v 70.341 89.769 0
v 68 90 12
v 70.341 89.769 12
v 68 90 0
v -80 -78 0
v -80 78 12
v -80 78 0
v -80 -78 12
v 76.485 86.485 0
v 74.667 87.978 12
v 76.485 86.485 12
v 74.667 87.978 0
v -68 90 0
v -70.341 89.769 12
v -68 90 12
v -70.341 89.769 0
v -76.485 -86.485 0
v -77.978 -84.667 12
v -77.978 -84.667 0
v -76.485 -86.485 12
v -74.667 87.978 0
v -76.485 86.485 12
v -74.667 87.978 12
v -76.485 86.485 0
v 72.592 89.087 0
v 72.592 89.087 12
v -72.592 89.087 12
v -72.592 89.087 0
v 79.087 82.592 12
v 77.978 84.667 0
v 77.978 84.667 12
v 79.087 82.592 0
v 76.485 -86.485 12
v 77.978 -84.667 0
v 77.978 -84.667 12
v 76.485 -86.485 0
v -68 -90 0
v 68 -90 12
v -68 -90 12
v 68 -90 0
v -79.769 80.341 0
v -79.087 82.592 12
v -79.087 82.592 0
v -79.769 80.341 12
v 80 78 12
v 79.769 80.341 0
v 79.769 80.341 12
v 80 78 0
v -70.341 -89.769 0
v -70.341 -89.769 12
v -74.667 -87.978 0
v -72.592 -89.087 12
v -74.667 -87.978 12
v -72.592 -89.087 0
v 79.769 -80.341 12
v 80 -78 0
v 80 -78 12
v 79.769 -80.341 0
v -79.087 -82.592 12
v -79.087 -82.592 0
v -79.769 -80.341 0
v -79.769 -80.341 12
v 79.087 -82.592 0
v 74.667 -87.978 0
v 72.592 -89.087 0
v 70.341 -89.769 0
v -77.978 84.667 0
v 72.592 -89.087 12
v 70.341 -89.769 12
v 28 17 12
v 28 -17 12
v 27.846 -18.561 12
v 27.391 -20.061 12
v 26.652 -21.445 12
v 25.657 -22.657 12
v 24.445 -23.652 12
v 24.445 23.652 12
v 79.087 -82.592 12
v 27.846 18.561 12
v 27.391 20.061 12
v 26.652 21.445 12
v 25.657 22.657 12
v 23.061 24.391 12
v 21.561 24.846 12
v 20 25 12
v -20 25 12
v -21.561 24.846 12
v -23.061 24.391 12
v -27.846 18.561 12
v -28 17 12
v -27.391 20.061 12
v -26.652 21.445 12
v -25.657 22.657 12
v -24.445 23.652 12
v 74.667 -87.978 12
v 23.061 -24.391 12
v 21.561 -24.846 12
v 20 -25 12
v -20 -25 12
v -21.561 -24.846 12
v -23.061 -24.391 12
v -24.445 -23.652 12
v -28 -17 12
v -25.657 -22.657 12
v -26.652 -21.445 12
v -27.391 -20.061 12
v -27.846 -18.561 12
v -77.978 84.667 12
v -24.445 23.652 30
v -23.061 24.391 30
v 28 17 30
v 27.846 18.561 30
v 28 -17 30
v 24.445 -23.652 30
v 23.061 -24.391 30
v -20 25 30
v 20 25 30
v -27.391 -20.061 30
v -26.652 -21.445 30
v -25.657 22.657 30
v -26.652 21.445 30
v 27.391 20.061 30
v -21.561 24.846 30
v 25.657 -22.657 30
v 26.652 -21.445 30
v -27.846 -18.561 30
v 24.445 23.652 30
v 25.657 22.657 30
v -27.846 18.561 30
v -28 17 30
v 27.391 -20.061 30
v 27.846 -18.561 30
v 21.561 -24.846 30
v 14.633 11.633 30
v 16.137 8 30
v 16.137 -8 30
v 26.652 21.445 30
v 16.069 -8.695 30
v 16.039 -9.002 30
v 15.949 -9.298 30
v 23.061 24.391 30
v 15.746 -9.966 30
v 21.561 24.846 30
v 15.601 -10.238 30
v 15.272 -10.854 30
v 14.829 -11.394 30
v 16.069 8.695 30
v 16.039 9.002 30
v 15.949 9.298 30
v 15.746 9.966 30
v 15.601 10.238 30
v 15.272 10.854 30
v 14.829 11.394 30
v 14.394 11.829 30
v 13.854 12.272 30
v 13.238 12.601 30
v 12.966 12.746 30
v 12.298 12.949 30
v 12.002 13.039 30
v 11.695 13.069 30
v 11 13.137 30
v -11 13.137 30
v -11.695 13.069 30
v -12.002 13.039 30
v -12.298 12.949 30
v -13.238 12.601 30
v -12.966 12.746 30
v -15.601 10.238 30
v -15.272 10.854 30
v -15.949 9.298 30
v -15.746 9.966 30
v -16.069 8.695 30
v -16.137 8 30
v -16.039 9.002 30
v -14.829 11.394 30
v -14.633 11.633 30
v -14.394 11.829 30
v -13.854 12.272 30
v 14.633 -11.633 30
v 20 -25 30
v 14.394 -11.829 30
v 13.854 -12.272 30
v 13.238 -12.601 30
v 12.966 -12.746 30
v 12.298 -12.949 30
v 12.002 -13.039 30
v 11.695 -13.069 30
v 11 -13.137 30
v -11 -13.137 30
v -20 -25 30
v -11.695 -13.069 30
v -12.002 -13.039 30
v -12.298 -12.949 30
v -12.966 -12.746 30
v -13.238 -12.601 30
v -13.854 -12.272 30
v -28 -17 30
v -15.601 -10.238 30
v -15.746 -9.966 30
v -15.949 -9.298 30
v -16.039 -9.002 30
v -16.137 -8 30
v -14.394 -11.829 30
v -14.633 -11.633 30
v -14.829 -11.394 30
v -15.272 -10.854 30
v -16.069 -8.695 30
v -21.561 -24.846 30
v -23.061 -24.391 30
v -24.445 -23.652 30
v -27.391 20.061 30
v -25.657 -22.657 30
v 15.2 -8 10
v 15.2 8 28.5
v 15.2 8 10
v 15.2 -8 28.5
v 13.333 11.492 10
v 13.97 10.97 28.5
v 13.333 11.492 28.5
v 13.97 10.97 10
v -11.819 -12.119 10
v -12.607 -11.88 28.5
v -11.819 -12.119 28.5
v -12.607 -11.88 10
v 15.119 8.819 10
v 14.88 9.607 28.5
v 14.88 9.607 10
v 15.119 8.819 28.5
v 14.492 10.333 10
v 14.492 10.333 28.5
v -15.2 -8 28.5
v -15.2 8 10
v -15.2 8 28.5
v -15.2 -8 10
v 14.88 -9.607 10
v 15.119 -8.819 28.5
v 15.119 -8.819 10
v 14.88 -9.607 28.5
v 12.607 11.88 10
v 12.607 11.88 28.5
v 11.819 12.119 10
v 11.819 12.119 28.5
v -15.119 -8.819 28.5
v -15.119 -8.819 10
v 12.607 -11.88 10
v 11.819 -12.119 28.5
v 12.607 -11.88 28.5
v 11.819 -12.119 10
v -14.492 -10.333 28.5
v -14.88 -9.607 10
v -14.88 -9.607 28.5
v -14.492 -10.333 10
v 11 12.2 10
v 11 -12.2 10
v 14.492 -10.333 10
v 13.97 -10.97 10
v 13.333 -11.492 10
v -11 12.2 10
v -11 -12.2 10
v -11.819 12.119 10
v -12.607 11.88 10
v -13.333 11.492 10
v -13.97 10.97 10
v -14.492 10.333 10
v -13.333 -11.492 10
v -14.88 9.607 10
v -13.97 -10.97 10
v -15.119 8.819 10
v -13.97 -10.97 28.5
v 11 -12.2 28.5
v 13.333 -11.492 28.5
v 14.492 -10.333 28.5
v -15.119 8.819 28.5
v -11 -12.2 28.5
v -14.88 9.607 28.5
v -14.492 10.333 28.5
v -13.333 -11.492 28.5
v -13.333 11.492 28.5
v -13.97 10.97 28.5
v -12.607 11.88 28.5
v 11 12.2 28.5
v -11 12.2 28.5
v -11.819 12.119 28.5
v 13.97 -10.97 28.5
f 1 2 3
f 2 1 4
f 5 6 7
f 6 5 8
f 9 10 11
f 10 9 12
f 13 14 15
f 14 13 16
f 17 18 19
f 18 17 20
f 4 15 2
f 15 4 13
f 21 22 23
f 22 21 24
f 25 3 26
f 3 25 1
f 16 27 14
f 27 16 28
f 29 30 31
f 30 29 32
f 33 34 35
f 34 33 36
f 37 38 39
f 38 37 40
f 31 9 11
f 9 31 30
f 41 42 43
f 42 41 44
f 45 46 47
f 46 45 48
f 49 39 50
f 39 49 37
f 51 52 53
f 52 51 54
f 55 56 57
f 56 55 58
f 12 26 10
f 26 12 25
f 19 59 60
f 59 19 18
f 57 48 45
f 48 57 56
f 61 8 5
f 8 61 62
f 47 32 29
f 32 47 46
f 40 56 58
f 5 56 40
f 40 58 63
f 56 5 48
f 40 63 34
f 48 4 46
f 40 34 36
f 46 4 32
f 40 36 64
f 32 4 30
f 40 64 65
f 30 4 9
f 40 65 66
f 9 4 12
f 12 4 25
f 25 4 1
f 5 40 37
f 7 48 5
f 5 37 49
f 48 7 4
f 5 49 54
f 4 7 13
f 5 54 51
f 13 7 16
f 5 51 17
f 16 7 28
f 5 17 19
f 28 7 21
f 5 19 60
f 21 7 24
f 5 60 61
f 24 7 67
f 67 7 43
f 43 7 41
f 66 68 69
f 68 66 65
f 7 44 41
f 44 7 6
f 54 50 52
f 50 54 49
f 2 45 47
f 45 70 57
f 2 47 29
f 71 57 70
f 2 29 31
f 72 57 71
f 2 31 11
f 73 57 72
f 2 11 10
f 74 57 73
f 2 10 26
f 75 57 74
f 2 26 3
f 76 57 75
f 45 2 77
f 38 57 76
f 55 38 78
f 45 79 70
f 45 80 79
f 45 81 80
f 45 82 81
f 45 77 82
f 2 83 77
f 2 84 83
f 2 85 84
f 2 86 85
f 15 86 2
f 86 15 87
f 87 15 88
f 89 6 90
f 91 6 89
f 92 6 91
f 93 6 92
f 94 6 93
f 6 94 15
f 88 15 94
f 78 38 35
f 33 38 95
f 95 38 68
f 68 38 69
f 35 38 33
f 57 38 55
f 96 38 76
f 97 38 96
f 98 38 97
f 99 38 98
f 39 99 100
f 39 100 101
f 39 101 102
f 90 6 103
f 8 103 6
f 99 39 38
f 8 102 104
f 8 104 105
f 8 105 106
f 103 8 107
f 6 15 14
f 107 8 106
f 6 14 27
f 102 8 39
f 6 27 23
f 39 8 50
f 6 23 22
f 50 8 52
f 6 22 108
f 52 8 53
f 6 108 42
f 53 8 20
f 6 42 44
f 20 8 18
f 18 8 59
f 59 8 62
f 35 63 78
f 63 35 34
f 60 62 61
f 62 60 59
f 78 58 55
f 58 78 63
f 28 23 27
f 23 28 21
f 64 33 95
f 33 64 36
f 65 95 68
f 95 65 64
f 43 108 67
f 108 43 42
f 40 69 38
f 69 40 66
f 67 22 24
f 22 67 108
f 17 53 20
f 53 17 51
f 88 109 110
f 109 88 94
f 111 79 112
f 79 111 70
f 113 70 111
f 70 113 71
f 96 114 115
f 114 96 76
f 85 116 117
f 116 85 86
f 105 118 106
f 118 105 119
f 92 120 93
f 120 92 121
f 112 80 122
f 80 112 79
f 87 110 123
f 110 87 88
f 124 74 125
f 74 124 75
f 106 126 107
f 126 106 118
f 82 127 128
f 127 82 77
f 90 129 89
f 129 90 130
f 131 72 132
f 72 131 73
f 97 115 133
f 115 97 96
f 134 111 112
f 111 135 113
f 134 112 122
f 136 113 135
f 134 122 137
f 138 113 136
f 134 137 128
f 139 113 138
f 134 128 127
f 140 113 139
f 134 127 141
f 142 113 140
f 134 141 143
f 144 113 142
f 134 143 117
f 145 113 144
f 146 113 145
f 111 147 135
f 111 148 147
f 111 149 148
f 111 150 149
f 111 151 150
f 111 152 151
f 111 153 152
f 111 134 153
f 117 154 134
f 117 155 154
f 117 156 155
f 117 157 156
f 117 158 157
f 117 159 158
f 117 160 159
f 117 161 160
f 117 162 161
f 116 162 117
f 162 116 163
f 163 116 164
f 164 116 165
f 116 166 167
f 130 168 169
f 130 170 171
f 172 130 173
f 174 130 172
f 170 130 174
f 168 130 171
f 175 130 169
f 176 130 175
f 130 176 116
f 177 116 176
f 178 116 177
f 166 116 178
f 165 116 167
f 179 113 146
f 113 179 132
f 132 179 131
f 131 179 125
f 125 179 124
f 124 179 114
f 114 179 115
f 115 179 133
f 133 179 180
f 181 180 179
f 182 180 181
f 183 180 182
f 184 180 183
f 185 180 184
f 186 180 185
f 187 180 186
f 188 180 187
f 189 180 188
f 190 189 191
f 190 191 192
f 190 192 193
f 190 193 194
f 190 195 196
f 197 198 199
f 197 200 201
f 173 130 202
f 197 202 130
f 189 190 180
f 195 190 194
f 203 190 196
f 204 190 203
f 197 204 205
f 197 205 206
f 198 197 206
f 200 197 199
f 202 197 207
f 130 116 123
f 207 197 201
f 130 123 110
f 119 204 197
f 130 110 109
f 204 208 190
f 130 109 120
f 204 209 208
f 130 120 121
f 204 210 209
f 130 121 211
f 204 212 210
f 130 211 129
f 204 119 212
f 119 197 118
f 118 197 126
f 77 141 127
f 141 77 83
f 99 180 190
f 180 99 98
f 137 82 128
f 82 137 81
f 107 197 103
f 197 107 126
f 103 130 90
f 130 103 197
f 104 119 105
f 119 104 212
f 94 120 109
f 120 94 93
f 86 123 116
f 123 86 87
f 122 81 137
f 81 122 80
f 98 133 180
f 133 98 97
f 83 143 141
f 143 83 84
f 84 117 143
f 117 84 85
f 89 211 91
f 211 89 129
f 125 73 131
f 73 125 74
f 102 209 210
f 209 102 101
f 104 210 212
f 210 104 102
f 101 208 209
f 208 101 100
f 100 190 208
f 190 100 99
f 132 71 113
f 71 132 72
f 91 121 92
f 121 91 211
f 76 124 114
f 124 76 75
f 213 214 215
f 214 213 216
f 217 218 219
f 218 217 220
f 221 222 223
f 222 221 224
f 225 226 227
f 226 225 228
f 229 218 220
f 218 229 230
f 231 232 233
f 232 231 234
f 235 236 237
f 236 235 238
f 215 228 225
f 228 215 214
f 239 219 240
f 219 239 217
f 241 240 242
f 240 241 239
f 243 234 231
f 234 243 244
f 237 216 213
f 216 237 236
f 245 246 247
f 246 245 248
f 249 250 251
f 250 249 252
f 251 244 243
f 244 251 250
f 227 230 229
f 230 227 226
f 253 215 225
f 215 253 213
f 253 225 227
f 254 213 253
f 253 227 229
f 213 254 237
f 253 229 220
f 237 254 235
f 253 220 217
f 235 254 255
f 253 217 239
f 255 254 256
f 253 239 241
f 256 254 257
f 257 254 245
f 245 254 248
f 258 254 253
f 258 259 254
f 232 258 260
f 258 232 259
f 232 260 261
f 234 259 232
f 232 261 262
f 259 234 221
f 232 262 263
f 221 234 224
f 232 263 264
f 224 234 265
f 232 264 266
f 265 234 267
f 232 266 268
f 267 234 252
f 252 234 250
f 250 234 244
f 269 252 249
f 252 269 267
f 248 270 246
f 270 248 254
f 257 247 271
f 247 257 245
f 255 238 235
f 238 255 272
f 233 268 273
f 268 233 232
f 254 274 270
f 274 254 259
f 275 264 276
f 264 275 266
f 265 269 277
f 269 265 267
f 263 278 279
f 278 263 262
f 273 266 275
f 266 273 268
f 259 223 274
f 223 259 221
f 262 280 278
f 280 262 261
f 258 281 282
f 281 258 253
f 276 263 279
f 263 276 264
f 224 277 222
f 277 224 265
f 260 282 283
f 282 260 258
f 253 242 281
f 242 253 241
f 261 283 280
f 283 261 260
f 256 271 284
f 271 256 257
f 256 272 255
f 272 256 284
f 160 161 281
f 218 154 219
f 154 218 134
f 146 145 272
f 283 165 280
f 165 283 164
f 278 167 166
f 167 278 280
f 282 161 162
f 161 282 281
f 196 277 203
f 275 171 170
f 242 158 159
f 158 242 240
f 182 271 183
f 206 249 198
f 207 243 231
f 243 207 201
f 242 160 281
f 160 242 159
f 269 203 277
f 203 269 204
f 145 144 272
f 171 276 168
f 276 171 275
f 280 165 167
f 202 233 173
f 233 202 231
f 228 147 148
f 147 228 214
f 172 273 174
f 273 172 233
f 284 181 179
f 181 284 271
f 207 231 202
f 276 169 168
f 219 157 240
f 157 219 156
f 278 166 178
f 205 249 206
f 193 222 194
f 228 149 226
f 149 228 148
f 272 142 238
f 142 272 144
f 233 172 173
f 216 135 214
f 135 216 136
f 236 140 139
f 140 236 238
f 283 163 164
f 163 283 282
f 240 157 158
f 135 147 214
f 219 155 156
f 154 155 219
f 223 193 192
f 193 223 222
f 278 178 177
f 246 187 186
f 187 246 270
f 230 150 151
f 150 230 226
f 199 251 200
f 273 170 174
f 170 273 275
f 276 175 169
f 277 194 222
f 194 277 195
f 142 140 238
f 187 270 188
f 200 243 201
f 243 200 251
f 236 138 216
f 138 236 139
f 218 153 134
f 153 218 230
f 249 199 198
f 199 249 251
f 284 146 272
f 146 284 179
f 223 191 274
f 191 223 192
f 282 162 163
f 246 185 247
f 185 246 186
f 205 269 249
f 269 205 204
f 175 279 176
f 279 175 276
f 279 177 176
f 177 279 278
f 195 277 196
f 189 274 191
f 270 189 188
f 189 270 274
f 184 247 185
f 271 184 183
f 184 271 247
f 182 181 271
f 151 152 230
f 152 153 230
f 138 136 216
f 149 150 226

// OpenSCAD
// Headphone stand in three parts - PLA, no supports, 0.4mm nozzle
// Print orientations (+Z up, bottom on bed):
//   base   : flat, plate bottom on bed
//   post   : vertical, bottom on bed (250+ tall)
//   hanger : flat bottom on bed, curved top up, socket opening down (bridged)
// Assembly (desk Z=0): base 0-30, post 10-262, hanger 244-270 (top ~270)

part = "base"; // [base:Base, post:Post, hanger:Hanger, assembly:Assembly]
cadverify_only = "";
module instance(name, part, unit = 1) {
    echo(cadverify_instance = [name, part, unit]);
    if (cadverify_only == "" || cadverify_only == name) children();
}

// ---------- parameters ----------
baseW = 160; baseD = 180; baseT = 12; baseR = 12;
bossW = 56; bossD = 50; bossH = 18; bossR = 8;
bossTop = baseT + bossH; // 30
sockW = 30.4; sockD = 24.4; sockR = 4.2; // base socket (post 30x24 +0.4)
sockDepthBase = 20;
sockFloorBase = bossTop - sockDepthBase; // 10
flare = 1.5;
mouthWBase = sockW + 2*flare; mouthDBase = sockD + 2*flare; mouthRBase = sockR + flare;

postW = 30; postD = 24; postR = 4; postH = 252; postCham = 1.5;
tipW = postW - 2*postCham; tipD = postD - 2*postCham; tipR = 2.5;

hangW = 42; hangL = 120; hangZc = 26; hangZe = 14; hangFillet = 8; hangPlanR = 15;
hangSockW = 30.4; hangSockD = 24.4; hangSockR = 4.2; hangSockDepth = 18;
mouthWH = hangSockW + 2*flare; mouthDH = hangSockD + 2*flare; mouthRH = hangSockR + flare;

postZ = 10;          // post bottom in assembly
hangerZ = 244;       // hanger bottom in assembly -> top 270
// post top = postZ+postH = 262 = hangerZ+hangSockDepth (socket floor)

// ---------- helpers ----------
module rounded_box(W,D,H,R) {
    // centered in XY, bottom at Z=0
    if (R <= 0.01) {
        translate([-W/2,-D/2,0]) cube([W,D,H]);
    } else {
        hull() {
            for (sx=[-1,1], sy=[-1,1])
                translate([sx*(W/2-R), sy*(D/2-R), 0])
                    cylinder(r=R, h=H, $fn=32);
        }
    }
}
module rect_frustum(W1,D1,R1, W2,D2,R2, H) {
    // bottom size 1 at Z=0, top size 2 at Z=H
    hull() {
        translate([0,0,0]) rounded_box(W1,D1,0.1,R1);
        translate([0,0,H-0.1]) rounded_box(W2,D2,0.1,R2);
    }
}

// ---------- parts (print orientation, bottom Z=0, centered XY) ----------
module base_part() {
    difference() {
        union() {
            rounded_box(baseW, baseD, baseT, baseR);
            translate([0,0,baseT-0.2]) rounded_box(bossW, bossD, bossH+0.2, bossR);
        }
        // socket bore (extend above mouth for clean cut)
        translate([0,0,sockFloorBase]) rounded_box(sockW, sockD, sockDepthBase+1.0, sockR);
        // entry flare 45deg (mouth larger at top)
        translate([0,0,bossTop-flare])
            rect_frustum(sockW,sockD,sockR, mouthWBase,mouthDBase,mouthRBase, flare+1.0);
    }
}

module post_part() {
    union() {
        // middle shaft (overlap frustums)
        translate([0,0,postCham-0.2]) rounded_box(postW, postD, postH-2*postCham+0.4, postR);
        // bottom lead-in (small face on bed)
        translate([0,0,0]) rect_frustum(tipW,tipD,tipR, postW,postD,postR, postCham+0.2);
        // top lead-in
        translate([0,0,postH-postCham-0.2]) rect_frustum(postW,postD,postR, tipW,tipD,tipR, postCham+0.2);
    }
}

module hanger_A() {
    union() {
        // lower block 0 .. Zc-r
        translate([-hangW/2, -hangL/2, 0]) cube([hangW, hangL, hangZc-hangFillet]);
        // upper block (narrower) Zc-r .. top
        translate([-(hangW-2*hangFillet)/2, -hangL/2, hangZc-hangFillet])
            cube([hangW-2*hangFillet, hangL, hangFillet]);
        // two side fillet cylinders along Y
        for (sx=[-1,1])
            translate([sx*(hangW/2-hangFillet), -hangL/2, hangZc-hangFillet])
                rotate([-90,0,0])
                    cylinder(r=hangFillet, h=hangL, $fn=32);
    }
}
module hanger_B() {
    // hull of slices under parabolic top (convex hypograph)
    N = 25;
    hull() {
        for (i=[0:N-1]) {
            yi = -hangL/2 + hangL*i/(N-1);
            hi = hangZc - (hangZc-hangZe)*pow(2*yi/hangL,2);
            translate([-hangW/2, yi-0.3, 0]) cube([hangW, 0.6, hi]);
        }
    }
}
module hanger_D() {
    rounded_box(hangW, hangL, 30, hangPlanR);
}
module hanger_part() {
    difference() {
        intersection() {
            hanger_A();
            hanger_B();
            hanger_D();
        }
        // socket bore (extend below bed for clean cut)
        translate([0,0,-0.5]) rounded_box(hangSockW, hangSockD, hangSockDepth+0.5, hangSockR);
        // entry flare at mouth (bottom)
        translate([0,0,-0.5])
            rect_frustum(mouthWH,mouthDH,mouthRH, hangSockW,hangSockD,hangSockR, flare+0.5);
    }
}

// ---------- specs ----------
if (part == "base") {
    echo(cadverify_spec = [
        ["bounds", [[-baseW/2, -baseD/2, 0], [baseW/2, baseD/2, bossTop]]],
        ["bodies", 1],
        ["through_holes", 0],
        ["support_faces", [["bed", "-z", 20000]]],
        ["overhangs_allowed", []],
        ["copies", 1],
        ["details", [
            ["plate", "material", [[-baseW/2, -baseD/2, 0], [baseW/2, baseD/2, baseT]], 0.95],
            ["boss", "material", [[-bossW/2, -bossD/2, baseT], [bossW/2, bossD/2, bossTop]], 0.60],
            ["socket", "void", [[-sockW/2, -sockD/2, sockFloorBase], [sockW/2, sockD/2, bossTop]], 0.90],
            ["floor", "thickness", [0, 0, -5], [0, 0, 1], 10],
            ["corner", "view", [[65, 75, 0], [80, 90, 12]]],
            ["mouth", "view", [[-17, -14, 28], [17, 14, 30]]]
        ]]
    ]);
    base_part();
} else if (part == "post") {
    echo(cadverify_spec = [
        ["bounds", [[-postW/2, -postD/2, 0], [postW/2, postD/2, postH]]],
        ["bodies", 1],
        ["through_holes", 0],
        ["support_faces", [["bed", "-z", 400]]],
        ["overhangs_allowed", []],
        ["copies", 1],
        ["details", [
            ["shaft", "material", [[-9.5, -9.5, 10], [9.5, 9.5, 242]], 0.99],
            ["wall", "thickness", [30, 0, 126], [-1, 0, 0], 30],
            ["lead", "view", [[-15, -12, 0], [15, 12, 3]]],
            ["topcham", "view", [[-15, -12, 249], [15, 12, 252]]]
        ]]
    ]);
    post_part();
} else if (part == "hanger") {
    echo(cadverify_spec = [
        ["bounds", [[-hangW/2, -hangL/2, 0], [hangW/2, hangL/2, hangZc]]],
        ["bodies", 1],
        ["through_holes", 0],
        ["support_faces", [["bed", "-z", 2500]]],
        ["overhangs_allowed", [["bridging socket ceiling", [[-hangSockW/2, -hangSockD/2, 16], [hangSockW/2, hangSockD/2, 20]]]]],
        ["copies", 1],
        ["details", [
            ["contact", "material", [[-15, -30, 18], [15, 30, 22]], 0.95],
            ["socket", "void", [[-hangSockW/2, -hangSockD/2, 0], [hangSockW/2, hangSockD/2, hangSockDepth]], 0.90],
            ["topwall", "thickness", [0, 0, 30], [0, 0, -1], 8],
            ["fillet", "view", [[13, -20, 18], [21, 20, 26]]],
            ["arch", "view", [[-21, -60, 12], [21, -40, 16]]],
            ["mouth", "view", [[-17, -14, 0], [17, 14, 2]]]
        ]]
    ]);
    hanger_part();
} else if (part == "assembly") {
    echo(cadverify_spec = [
        ["bounds", [[-baseW/2, -baseD/2, 0], [baseW/2, baseD/2, hangerZ+hangZc]]],
        ["support_faces", [["desk", "-z", 20000]]],
        ["allowed_interferences", []],
        ["motions", []],
        ["assembly_order", [
            [["base_1"], [0, 0, 0]],
            [["post_1"], [0, 0, 1]],
            [["hanger_1"], [0, 0, 1]]
        ]]
    ]);
    instance("base_1", "base") translate([0,0,0]) base_part();
    instance("post_1", "post") translate([0,0,postZ]) post_part();
    instance("hanger_1", "hanger") translate([0,0,hangerZ]) hanger_part();
}
